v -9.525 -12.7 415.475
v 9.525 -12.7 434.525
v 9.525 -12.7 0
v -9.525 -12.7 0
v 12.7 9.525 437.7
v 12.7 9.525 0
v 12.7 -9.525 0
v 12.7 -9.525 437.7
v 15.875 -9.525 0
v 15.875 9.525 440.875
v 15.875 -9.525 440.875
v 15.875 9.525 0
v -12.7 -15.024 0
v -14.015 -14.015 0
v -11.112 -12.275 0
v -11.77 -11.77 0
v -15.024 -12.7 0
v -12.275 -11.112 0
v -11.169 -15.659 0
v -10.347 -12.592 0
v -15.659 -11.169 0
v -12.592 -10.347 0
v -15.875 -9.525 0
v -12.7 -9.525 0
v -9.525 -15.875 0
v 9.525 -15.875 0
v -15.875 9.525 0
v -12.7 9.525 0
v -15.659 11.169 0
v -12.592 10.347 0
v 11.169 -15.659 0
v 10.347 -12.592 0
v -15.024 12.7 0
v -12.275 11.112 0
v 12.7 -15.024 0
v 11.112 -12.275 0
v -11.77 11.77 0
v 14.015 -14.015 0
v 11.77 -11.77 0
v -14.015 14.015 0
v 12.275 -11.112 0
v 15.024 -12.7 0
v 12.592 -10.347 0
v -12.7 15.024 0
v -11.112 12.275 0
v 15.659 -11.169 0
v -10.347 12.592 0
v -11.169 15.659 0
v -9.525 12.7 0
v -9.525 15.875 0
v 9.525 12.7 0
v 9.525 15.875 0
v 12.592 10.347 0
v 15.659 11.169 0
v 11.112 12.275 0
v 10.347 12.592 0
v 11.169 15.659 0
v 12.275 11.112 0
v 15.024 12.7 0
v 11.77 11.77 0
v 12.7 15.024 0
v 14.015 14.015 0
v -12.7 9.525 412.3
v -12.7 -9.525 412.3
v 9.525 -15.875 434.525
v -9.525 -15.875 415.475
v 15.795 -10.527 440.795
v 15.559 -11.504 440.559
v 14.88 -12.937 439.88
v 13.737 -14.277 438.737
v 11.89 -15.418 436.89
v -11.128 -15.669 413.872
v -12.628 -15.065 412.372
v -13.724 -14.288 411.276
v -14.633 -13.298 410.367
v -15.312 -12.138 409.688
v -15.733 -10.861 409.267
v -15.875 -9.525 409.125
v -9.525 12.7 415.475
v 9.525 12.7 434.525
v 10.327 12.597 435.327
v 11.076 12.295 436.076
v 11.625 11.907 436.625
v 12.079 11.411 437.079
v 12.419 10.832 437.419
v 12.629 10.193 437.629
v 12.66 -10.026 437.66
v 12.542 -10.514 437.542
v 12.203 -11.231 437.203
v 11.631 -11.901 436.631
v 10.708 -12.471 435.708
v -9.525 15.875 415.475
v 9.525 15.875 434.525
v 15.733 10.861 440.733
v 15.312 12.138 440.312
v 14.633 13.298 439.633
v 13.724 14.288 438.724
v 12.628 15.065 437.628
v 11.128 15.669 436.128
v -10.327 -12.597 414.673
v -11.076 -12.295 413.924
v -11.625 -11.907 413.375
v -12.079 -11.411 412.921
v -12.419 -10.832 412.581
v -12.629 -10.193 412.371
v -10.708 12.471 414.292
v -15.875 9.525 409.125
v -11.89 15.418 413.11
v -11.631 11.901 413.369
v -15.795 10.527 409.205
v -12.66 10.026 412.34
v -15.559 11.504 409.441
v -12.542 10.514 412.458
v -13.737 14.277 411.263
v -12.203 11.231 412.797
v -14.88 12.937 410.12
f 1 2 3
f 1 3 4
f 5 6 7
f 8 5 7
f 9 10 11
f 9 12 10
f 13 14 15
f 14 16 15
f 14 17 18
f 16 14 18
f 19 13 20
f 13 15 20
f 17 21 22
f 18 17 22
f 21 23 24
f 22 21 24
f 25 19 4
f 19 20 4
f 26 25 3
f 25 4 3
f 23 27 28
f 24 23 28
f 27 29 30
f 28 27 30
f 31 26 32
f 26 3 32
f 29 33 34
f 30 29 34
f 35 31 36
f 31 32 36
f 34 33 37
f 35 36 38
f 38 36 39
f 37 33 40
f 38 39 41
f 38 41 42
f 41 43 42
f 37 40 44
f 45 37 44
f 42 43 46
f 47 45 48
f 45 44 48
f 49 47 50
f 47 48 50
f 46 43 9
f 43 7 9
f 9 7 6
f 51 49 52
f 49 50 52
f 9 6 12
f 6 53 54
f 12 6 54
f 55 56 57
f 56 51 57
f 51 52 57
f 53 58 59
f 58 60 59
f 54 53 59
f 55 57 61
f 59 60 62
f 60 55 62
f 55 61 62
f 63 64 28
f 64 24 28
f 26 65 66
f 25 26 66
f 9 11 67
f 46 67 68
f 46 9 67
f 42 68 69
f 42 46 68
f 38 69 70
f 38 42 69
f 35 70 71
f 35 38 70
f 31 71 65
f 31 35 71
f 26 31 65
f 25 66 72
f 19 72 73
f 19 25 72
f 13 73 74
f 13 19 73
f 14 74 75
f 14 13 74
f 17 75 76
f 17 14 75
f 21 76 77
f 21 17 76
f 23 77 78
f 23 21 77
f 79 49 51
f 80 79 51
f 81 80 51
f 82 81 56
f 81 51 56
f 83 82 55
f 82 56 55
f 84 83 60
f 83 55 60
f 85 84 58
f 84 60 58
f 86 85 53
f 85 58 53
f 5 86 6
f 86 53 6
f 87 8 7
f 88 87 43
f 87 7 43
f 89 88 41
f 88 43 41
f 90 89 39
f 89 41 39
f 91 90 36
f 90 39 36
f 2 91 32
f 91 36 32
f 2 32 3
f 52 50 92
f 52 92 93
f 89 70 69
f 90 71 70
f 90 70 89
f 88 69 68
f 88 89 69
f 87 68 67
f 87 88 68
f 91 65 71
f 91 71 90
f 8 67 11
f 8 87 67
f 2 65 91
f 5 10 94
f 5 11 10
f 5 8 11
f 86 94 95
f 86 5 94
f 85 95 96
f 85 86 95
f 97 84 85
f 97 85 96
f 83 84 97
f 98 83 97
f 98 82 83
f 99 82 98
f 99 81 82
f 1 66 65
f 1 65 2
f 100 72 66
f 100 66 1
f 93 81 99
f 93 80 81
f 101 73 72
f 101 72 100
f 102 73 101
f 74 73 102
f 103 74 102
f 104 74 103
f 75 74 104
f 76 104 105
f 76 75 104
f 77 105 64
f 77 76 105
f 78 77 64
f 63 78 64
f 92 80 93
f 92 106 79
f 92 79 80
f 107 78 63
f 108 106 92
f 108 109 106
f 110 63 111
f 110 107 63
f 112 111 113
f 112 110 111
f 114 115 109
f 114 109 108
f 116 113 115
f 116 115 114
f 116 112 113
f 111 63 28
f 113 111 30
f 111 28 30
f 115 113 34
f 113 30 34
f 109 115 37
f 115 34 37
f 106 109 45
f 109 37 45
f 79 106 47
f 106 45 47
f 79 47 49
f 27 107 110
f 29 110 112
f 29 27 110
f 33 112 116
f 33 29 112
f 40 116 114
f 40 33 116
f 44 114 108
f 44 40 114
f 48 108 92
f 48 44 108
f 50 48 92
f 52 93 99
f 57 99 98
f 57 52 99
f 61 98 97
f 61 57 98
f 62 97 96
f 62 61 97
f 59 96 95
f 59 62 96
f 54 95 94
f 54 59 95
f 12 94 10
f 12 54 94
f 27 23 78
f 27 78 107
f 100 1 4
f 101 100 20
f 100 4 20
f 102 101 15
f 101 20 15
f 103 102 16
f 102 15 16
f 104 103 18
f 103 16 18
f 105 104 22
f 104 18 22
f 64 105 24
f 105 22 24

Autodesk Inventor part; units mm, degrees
ref_plane "Start Plane" through (0, 0, 0) normal (0, 0, 1) x (1, 0, 0)
ref_plane "End Plane" through (0, 0, 440.875) normal (0, 0, 1) x (1, 0, 0)
sketch "Sketch" plane through (0, 0, 0) normal (0, 0, 1) x (1, 0, 0)
  line L0 (-15.875, -9.525) -> (-15.875, 9.525)
  line L1 (-9.525, 15.875) -> (9.525, 15.875)
  line L2 (15.875, 9.525) -> (15.875, -9.525)
  line L3 (9.525, -15.875) -> (-9.525, -15.875)
  arc A0 (-15.875, -9.525) -> (-9.525, -15.875) centre (-9.525, -9.525) ccw
  arc A1 (-9.525, 15.875) -> (-15.875, 9.525) centre (-9.525, 9.525) ccw
  arc A2 (15.875, 9.525) -> (9.525, 15.875) centre (9.525, 9.525) ccw
  arc A3 (9.525, -15.875) -> (15.875, -9.525) centre (9.525, -9.525) ccw
  arc A4 (-9.525, 12.7) -> (-12.7, 9.525) centre (-9.525, 9.525) ccw
  line L4 (-9.525, 12.7) -> (9.525, 12.7)
  arc A5 (12.7, 9.525) -> (9.525, 12.7) centre (9.525, 9.525) ccw
  line L5 (12.7, 9.525) -> (12.7, -9.525)
  arc A6 (9.525, -12.7) -> (12.7, -9.525) centre (9.525, -9.525) ccw
  line L6 (9.525, -12.7) -> (-9.525, -12.7)
  arc A7 (-12.7, -9.525) -> (-9.525, -12.7) centre (-9.525, -9.525) ccw
  line L7 (-12.7, -9.525) -> (-12.7, 9.525)
  line L8 (0, 24.0662) -> (0, -24.0662) construction
  line L9 (-24.0662, 0) -> (24.0662, 0) construction
  dimension "d10" = 31.75
  dimension "d11" = 31.75
  dimension "d12" = 3.175
  dimension "d15" = 15.875
  dimension "d16" = 15.875
  dimension "d17" = 6.35
extrude "Body" add sketch "Sketch" along normal up to surface (440.875 mm away) from surface at 0
sketch "Sketch3" plane through (0, 0, 0) normal (0, 0, 1) x (1, 0, 0)
  line L0 (0, 0) -> (10, 0)
ref_plane "Work Plane3" through (0, 0, 0) normal (0, -1, 0) x (1, 0, 0)
sketch "Sketch4" plane through (0, 0, 0) normal (0, -1, 0) x (1, 0, 0)
  line L0 (-2, 0) -> (12, 0)
  line L1 (-2, 440.875) -> (12, 440.875)
  dimension "d19" = 440.875
ref_plane "Work Plane4" through (15.875, 0, 440.875) normal (-0.7071, 0, 0.7071) x (0.7071, 0, 0.7071)
split "Split1" plane through (15.875, 0, 440.875) removes the side toward (-0.7071, 0, 0.7071)
equation "\"d10\" = G_H"
equation "\"d11\" = G_W"
equation "\"d12\" = G_T"
equation "\"d15\" = 0.5 * d10"
equation "\"d16\" = 0.5 * d11"
equation "\"d17\" = G_IR"
equation "\"d3\" = G_L"
equation "\"G_W\" = 31.75"
equation "\"G_H\" = 31.75"
equation "\"G_T\" = 3.175"
equation "\"G_IR\" = 6.35"
equation "\"G_L\" = d19"
equation "\"G_OFFSET_START\" = 0"
equation "\"G_OFFSET_END\" = 15.875"
equation "\"d14\" = G_OFFSET_END + B_L"
equation "\"B_L\" = 425"
properties part number "AISC HSS - (1 1/4x1 1/4x1/8) - 17.357" material "Steel, Mild"
